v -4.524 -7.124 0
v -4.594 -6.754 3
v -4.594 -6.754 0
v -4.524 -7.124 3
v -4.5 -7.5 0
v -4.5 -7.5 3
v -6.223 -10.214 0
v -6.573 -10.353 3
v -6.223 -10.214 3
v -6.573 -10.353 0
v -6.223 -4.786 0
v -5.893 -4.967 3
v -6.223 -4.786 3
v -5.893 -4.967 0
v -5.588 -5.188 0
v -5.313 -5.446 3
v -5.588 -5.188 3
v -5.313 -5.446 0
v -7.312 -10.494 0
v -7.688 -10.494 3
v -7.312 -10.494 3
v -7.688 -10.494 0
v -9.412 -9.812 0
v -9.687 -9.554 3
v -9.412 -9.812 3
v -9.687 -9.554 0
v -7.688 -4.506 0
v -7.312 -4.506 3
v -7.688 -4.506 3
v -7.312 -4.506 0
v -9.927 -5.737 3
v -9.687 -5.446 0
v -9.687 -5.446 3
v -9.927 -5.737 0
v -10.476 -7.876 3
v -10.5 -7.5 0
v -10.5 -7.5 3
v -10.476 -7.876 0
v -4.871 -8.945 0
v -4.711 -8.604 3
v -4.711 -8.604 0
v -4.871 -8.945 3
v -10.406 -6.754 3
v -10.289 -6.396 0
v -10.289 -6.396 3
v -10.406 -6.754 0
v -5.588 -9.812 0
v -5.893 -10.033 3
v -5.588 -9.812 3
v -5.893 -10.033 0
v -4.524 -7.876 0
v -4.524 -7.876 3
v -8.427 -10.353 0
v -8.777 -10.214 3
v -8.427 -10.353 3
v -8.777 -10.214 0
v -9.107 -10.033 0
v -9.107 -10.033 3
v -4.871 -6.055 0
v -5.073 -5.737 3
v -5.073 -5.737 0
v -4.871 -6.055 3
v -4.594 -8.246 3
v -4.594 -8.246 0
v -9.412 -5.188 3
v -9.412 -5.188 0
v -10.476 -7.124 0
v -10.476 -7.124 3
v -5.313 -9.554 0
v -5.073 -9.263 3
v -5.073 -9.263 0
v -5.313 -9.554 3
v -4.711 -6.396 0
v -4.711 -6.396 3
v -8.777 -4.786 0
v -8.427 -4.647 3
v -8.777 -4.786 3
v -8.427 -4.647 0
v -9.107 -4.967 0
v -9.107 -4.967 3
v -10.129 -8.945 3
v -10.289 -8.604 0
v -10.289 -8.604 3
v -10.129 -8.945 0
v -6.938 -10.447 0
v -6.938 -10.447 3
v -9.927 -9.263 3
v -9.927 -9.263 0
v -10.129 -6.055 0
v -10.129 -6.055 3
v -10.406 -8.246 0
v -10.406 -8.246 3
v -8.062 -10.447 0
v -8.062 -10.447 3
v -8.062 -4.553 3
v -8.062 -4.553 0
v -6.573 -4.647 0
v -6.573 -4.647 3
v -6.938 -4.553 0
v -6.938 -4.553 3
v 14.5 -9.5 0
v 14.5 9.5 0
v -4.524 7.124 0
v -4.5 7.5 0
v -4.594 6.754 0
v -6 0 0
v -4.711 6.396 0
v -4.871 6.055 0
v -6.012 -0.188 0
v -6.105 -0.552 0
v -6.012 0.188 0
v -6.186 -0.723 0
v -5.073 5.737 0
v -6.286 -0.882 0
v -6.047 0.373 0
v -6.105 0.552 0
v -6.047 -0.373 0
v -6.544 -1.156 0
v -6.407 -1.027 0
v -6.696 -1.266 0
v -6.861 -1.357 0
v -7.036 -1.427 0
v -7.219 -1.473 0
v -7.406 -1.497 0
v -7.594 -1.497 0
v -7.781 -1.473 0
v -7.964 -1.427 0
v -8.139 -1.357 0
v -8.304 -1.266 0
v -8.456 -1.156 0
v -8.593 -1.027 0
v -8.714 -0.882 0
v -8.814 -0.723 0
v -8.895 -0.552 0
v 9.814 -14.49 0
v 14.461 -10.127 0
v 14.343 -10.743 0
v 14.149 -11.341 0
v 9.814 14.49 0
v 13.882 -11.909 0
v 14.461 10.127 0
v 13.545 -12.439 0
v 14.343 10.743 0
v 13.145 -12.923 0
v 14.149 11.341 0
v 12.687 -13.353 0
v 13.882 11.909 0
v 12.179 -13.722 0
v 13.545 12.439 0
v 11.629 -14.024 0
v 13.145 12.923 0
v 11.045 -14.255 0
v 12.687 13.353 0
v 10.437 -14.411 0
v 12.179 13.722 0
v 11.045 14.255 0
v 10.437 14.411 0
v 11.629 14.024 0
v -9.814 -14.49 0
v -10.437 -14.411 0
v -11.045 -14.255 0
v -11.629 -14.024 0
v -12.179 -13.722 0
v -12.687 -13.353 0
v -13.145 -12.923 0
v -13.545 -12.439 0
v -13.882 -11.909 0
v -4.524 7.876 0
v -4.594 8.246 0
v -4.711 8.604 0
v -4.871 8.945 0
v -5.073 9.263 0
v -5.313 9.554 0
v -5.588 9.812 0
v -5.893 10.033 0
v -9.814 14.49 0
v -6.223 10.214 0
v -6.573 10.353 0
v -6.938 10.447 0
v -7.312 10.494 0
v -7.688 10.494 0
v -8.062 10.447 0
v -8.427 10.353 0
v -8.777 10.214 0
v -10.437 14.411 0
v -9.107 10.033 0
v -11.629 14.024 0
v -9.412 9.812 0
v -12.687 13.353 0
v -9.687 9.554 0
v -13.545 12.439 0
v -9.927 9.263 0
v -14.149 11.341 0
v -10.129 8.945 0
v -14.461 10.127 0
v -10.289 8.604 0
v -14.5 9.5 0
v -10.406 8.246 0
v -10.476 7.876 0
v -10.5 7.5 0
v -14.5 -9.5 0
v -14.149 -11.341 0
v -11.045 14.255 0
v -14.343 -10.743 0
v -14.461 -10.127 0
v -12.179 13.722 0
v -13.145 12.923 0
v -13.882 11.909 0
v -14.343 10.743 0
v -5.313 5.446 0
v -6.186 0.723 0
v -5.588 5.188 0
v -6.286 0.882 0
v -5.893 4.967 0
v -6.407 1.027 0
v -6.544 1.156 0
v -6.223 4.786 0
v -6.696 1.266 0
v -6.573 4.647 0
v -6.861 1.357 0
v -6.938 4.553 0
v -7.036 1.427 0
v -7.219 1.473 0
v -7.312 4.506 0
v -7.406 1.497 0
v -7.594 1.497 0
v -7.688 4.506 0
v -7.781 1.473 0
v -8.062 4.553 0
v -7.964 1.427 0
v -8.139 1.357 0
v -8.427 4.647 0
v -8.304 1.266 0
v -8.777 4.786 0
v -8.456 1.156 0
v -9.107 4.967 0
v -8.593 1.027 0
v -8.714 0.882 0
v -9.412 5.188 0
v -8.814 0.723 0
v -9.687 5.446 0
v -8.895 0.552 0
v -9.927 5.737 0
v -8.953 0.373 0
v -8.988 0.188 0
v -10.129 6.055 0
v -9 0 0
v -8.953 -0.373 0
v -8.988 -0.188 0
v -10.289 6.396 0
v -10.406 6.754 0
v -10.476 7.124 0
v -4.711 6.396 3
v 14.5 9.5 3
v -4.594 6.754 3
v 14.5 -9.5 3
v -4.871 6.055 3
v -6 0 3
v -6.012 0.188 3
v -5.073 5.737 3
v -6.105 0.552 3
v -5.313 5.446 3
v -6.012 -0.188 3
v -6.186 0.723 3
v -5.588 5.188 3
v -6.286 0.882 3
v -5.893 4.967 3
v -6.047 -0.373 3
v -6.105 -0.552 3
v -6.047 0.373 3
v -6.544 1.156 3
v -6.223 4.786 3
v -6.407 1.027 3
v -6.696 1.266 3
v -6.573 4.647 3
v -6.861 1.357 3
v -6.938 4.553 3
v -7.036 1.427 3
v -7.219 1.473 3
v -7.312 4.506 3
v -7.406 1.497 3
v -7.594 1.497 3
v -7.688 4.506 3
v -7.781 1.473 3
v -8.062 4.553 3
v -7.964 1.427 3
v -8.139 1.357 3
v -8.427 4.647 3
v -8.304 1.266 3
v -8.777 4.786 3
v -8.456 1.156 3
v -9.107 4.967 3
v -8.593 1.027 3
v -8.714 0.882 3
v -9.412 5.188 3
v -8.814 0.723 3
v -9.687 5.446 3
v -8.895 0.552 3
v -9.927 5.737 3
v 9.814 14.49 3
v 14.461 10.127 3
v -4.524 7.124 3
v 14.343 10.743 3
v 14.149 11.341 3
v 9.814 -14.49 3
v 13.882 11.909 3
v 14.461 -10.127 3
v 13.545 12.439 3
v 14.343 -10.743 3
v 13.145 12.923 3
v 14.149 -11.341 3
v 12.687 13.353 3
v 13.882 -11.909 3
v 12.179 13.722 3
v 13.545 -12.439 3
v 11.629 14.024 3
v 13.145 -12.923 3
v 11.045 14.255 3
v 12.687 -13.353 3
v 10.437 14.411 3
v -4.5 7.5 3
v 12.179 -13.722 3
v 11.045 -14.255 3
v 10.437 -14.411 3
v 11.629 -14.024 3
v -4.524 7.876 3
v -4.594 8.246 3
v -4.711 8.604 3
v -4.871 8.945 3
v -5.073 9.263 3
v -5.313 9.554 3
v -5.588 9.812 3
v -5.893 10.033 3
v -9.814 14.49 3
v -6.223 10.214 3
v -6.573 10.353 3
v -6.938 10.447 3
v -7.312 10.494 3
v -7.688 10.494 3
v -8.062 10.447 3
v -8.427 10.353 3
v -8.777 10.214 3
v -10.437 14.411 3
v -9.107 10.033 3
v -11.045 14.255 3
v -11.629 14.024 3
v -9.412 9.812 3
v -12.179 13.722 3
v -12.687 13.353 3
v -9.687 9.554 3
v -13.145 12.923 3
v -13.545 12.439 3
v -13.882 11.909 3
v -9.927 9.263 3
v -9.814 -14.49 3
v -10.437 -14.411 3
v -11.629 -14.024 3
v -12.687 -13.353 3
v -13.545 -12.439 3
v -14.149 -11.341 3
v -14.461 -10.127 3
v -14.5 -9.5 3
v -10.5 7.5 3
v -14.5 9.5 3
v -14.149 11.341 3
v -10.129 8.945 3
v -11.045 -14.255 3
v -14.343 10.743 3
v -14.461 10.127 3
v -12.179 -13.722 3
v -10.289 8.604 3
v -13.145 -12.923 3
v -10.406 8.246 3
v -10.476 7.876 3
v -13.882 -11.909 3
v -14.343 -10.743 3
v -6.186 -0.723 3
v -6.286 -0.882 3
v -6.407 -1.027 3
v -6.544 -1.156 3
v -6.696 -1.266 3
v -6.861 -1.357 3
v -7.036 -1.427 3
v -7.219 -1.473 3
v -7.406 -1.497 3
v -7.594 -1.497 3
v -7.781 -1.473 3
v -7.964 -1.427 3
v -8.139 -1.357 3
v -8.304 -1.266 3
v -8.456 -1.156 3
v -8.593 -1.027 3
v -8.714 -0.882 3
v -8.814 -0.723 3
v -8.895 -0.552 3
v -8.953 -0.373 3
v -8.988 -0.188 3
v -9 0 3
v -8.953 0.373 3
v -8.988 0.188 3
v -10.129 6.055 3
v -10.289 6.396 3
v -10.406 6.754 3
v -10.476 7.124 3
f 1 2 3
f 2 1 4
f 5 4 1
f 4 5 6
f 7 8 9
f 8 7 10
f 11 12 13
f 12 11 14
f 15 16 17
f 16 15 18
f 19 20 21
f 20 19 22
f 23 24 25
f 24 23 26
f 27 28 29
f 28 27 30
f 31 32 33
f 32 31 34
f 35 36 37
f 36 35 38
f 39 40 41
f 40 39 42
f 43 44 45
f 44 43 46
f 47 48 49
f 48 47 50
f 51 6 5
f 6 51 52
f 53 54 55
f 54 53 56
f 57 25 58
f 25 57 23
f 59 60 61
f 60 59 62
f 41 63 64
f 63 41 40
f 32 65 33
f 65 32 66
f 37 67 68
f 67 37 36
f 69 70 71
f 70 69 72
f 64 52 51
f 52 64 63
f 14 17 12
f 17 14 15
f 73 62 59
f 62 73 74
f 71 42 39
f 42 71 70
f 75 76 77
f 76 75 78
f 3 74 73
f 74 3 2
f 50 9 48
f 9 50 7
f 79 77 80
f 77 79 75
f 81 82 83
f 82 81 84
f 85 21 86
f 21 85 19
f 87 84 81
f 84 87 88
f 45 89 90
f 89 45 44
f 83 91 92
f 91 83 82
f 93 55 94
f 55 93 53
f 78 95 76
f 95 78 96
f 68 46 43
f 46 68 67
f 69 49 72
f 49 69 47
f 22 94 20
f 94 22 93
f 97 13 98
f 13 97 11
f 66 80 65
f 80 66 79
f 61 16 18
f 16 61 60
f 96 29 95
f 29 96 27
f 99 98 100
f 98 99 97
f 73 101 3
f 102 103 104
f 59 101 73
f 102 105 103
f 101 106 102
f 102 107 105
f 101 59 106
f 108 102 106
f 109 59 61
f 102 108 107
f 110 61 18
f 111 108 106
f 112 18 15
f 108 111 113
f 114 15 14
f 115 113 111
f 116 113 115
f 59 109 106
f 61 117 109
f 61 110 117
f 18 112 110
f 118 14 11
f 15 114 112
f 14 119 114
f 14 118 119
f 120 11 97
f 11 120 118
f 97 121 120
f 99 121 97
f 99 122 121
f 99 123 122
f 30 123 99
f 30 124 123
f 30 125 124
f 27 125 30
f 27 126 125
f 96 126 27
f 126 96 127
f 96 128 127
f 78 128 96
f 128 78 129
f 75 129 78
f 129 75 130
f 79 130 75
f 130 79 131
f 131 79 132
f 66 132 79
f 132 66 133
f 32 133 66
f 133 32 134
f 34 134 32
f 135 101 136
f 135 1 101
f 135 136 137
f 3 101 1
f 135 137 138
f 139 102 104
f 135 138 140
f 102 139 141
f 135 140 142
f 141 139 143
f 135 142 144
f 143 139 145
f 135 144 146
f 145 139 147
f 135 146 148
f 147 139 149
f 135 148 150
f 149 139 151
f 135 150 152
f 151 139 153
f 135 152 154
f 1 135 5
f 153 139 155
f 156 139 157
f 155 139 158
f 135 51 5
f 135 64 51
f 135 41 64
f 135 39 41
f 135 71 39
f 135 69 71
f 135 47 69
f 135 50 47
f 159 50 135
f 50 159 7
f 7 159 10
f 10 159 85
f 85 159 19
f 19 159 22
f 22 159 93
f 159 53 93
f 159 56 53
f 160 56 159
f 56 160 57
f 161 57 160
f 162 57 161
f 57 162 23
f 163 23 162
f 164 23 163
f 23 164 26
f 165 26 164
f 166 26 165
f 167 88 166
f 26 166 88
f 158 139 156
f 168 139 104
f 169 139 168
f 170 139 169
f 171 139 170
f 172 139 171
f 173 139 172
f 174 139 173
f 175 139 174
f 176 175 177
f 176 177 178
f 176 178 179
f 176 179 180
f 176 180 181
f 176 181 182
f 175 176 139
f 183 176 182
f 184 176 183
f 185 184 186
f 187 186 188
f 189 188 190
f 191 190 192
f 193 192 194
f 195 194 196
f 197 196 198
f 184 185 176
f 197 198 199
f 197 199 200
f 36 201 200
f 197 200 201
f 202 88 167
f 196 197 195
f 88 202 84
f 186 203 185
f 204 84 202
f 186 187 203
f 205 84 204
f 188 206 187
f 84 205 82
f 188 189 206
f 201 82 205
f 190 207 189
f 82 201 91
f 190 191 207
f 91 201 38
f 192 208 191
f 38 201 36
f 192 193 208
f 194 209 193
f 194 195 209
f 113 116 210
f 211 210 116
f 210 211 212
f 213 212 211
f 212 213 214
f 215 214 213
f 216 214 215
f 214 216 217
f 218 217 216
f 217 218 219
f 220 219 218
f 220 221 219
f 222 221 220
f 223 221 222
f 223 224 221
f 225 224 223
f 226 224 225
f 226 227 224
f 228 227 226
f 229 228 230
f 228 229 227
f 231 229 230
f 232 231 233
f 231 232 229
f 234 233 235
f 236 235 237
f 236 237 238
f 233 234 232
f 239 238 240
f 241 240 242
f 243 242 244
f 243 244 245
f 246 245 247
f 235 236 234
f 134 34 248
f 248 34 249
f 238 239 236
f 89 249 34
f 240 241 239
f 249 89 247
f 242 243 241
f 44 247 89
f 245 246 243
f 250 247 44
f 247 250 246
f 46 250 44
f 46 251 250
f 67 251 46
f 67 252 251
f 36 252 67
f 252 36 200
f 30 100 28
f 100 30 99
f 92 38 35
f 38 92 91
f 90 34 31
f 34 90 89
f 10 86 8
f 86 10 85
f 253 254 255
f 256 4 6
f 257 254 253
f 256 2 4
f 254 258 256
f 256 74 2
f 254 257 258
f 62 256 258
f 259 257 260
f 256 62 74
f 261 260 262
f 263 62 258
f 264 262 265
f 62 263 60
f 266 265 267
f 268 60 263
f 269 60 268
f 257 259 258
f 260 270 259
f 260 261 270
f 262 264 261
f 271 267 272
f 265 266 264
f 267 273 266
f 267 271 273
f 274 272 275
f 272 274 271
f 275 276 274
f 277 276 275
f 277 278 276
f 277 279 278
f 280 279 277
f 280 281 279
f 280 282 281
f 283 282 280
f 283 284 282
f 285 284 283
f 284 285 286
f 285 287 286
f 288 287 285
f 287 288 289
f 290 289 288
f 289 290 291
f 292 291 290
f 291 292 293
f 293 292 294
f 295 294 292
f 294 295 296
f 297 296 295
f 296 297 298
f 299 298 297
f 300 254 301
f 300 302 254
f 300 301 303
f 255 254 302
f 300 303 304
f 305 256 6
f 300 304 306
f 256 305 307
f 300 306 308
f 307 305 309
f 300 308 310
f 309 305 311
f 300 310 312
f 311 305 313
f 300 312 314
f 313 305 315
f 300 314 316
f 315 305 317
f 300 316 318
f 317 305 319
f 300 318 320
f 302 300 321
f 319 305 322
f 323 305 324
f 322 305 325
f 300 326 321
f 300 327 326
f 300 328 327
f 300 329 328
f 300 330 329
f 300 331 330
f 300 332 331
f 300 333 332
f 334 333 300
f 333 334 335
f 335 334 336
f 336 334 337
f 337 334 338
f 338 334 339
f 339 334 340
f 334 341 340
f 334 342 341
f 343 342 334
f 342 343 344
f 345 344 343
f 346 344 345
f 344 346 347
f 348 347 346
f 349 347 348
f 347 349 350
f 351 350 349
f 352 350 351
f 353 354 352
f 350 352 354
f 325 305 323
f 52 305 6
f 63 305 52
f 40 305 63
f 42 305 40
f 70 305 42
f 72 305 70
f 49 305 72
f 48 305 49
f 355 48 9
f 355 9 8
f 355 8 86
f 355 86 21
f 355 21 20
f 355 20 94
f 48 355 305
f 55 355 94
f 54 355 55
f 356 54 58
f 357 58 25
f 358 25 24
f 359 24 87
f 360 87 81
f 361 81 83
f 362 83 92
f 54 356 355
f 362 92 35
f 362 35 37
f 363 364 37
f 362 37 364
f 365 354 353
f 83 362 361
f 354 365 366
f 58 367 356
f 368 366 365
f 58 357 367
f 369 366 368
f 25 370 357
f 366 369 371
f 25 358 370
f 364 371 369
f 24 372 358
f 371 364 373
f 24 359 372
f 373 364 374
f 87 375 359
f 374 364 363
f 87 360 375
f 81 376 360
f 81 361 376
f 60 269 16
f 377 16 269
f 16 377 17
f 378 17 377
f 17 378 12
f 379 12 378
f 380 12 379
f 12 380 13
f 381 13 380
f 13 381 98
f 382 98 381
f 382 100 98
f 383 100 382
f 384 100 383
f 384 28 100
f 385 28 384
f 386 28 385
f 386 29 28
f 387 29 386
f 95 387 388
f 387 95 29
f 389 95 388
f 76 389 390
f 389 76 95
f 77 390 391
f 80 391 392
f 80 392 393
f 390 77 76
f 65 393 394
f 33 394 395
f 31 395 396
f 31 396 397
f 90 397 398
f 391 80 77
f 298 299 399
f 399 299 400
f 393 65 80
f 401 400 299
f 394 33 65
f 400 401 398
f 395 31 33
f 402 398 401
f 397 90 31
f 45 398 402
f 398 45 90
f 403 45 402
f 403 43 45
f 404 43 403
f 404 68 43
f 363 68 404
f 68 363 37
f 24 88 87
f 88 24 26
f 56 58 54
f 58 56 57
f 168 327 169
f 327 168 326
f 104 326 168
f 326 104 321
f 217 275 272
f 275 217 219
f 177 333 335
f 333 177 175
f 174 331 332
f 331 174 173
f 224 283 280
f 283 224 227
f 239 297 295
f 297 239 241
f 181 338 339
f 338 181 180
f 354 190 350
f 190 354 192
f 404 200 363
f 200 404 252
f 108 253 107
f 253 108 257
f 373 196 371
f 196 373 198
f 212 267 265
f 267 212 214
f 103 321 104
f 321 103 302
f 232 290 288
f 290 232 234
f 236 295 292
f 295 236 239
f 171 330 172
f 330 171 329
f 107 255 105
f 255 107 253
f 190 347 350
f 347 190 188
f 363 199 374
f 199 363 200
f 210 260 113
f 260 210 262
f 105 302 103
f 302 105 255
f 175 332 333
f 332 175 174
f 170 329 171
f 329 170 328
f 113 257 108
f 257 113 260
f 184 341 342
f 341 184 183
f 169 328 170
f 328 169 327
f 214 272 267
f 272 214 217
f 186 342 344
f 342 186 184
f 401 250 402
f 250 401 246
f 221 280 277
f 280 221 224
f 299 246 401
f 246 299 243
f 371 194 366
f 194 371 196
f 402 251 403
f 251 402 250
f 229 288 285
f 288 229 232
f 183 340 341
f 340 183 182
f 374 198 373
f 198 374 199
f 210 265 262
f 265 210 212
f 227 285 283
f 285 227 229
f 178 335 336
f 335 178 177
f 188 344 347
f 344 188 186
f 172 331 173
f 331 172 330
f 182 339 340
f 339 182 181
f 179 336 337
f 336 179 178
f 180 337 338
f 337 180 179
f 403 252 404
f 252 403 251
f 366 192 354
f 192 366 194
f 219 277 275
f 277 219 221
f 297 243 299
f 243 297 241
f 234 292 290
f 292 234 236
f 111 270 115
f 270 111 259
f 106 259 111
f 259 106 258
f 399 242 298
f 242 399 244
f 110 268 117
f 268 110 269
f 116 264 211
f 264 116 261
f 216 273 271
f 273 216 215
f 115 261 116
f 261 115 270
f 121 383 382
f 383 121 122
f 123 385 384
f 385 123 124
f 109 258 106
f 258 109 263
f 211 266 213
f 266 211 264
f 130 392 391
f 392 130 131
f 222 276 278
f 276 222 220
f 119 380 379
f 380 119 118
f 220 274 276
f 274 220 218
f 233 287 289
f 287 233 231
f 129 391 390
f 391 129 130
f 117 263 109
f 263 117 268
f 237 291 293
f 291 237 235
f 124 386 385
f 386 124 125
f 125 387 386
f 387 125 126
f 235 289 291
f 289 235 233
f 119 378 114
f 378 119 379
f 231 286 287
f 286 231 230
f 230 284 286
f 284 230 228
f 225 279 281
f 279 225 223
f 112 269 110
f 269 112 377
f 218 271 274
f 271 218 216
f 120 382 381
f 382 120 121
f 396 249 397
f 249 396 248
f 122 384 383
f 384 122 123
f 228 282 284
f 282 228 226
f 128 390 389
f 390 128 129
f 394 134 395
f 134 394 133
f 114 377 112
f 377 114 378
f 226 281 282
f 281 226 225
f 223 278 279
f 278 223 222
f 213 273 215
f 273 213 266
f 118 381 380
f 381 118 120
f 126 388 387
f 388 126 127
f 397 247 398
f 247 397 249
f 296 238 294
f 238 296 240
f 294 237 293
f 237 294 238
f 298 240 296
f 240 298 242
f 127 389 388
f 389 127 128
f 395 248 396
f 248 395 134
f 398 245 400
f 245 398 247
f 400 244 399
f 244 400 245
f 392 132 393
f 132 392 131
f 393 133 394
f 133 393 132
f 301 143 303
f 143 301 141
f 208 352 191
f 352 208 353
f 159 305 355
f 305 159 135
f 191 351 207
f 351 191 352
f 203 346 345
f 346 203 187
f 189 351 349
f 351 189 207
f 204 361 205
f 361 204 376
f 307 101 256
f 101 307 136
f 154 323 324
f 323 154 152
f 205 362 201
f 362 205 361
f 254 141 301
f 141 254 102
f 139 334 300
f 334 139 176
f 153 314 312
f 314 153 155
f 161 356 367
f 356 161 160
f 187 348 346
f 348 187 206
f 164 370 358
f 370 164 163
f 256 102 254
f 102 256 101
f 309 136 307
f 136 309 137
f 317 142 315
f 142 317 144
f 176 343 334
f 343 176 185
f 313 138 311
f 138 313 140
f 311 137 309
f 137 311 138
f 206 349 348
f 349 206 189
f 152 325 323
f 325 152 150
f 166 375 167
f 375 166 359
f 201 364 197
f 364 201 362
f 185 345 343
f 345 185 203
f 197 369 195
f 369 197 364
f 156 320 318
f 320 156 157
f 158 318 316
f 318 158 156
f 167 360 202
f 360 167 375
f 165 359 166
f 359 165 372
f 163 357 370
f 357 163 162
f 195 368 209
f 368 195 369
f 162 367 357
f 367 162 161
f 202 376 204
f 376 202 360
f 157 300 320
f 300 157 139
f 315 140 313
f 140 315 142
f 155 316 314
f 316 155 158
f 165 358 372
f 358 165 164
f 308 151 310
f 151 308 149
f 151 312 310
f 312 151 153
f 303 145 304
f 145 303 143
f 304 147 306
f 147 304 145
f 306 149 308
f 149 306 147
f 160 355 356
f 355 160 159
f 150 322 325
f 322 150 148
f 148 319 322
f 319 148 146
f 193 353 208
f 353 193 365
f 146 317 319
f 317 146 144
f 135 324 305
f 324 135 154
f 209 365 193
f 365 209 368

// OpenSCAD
$fn = 50;


difference() {
	union() {
		hull() {
			translate(v = [-9.5000000000, 9.5000000000, 0]) {
				cylinder(h = 3, r = 5);
			}
			translate(v = [9.5000000000, 9.5000000000, 0]) {
				cylinder(h = 3, r = 5);
			}
			translate(v = [-9.5000000000, -9.5000000000, 0]) {
				cylinder(h = 3, r = 5);
			}
			translate(v = [9.5000000000, -9.5000000000, 0]) {
				cylinder(h = 3, r = 5);
			}
		}
	}
	union() {
		translate(v = [-7.5000000000, -7.5000000000, 0]) {
			cylinder(h = 3, r = 3.0000000000);
		}
		translate(v = [-7.5000000000, 7.5000000000, 0]) {
			cylinder(h = 3, r = 3.0000000000);
		}
		translate(v = [-7.5000000000, -7.5000000000, 0]) {
			cylinder(h = 3, r = 1.5000000000);
		}
		translate(v = [-7.5000000000, 0.0000000000, 0]) {
			cylinder(h = 3, r = 1.5000000000);
		}
		translate(v = [-7.5000000000, 7.5000000000, 0]) {
			cylinder(h = 3, r = 1.5000000000);
		}
		translate(v = [-7.5000000000, -7.5000000000, 0]) {
			cylinder(h = 3, r = 1.5000000000);
		}
		translate(v = [-7.5000000000, 0.0000000000, 0]) {
			cylinder(h = 3, r = 1.5000000000);
		}
		translate(v = [-7.5000000000, 7.5000000000, 0]) {
			cylinder(h = 3, r = 1.5000000000);
		}
		translate(v = [-7.5000000000, -7.5000000000, 0]) {
			cylinder(h = 3, r = 1.5000000000);
		}
		translate(v = [-7.5000000000, 0.0000000000, 0]) {
			cylinder(h = 3, r = 1.5000000000);
		}
		translate(v = [-7.5000000000, 7.5000000000, 0]) {
			cylinder(h = 3, r = 1.5000000000);
		}
	}
}
